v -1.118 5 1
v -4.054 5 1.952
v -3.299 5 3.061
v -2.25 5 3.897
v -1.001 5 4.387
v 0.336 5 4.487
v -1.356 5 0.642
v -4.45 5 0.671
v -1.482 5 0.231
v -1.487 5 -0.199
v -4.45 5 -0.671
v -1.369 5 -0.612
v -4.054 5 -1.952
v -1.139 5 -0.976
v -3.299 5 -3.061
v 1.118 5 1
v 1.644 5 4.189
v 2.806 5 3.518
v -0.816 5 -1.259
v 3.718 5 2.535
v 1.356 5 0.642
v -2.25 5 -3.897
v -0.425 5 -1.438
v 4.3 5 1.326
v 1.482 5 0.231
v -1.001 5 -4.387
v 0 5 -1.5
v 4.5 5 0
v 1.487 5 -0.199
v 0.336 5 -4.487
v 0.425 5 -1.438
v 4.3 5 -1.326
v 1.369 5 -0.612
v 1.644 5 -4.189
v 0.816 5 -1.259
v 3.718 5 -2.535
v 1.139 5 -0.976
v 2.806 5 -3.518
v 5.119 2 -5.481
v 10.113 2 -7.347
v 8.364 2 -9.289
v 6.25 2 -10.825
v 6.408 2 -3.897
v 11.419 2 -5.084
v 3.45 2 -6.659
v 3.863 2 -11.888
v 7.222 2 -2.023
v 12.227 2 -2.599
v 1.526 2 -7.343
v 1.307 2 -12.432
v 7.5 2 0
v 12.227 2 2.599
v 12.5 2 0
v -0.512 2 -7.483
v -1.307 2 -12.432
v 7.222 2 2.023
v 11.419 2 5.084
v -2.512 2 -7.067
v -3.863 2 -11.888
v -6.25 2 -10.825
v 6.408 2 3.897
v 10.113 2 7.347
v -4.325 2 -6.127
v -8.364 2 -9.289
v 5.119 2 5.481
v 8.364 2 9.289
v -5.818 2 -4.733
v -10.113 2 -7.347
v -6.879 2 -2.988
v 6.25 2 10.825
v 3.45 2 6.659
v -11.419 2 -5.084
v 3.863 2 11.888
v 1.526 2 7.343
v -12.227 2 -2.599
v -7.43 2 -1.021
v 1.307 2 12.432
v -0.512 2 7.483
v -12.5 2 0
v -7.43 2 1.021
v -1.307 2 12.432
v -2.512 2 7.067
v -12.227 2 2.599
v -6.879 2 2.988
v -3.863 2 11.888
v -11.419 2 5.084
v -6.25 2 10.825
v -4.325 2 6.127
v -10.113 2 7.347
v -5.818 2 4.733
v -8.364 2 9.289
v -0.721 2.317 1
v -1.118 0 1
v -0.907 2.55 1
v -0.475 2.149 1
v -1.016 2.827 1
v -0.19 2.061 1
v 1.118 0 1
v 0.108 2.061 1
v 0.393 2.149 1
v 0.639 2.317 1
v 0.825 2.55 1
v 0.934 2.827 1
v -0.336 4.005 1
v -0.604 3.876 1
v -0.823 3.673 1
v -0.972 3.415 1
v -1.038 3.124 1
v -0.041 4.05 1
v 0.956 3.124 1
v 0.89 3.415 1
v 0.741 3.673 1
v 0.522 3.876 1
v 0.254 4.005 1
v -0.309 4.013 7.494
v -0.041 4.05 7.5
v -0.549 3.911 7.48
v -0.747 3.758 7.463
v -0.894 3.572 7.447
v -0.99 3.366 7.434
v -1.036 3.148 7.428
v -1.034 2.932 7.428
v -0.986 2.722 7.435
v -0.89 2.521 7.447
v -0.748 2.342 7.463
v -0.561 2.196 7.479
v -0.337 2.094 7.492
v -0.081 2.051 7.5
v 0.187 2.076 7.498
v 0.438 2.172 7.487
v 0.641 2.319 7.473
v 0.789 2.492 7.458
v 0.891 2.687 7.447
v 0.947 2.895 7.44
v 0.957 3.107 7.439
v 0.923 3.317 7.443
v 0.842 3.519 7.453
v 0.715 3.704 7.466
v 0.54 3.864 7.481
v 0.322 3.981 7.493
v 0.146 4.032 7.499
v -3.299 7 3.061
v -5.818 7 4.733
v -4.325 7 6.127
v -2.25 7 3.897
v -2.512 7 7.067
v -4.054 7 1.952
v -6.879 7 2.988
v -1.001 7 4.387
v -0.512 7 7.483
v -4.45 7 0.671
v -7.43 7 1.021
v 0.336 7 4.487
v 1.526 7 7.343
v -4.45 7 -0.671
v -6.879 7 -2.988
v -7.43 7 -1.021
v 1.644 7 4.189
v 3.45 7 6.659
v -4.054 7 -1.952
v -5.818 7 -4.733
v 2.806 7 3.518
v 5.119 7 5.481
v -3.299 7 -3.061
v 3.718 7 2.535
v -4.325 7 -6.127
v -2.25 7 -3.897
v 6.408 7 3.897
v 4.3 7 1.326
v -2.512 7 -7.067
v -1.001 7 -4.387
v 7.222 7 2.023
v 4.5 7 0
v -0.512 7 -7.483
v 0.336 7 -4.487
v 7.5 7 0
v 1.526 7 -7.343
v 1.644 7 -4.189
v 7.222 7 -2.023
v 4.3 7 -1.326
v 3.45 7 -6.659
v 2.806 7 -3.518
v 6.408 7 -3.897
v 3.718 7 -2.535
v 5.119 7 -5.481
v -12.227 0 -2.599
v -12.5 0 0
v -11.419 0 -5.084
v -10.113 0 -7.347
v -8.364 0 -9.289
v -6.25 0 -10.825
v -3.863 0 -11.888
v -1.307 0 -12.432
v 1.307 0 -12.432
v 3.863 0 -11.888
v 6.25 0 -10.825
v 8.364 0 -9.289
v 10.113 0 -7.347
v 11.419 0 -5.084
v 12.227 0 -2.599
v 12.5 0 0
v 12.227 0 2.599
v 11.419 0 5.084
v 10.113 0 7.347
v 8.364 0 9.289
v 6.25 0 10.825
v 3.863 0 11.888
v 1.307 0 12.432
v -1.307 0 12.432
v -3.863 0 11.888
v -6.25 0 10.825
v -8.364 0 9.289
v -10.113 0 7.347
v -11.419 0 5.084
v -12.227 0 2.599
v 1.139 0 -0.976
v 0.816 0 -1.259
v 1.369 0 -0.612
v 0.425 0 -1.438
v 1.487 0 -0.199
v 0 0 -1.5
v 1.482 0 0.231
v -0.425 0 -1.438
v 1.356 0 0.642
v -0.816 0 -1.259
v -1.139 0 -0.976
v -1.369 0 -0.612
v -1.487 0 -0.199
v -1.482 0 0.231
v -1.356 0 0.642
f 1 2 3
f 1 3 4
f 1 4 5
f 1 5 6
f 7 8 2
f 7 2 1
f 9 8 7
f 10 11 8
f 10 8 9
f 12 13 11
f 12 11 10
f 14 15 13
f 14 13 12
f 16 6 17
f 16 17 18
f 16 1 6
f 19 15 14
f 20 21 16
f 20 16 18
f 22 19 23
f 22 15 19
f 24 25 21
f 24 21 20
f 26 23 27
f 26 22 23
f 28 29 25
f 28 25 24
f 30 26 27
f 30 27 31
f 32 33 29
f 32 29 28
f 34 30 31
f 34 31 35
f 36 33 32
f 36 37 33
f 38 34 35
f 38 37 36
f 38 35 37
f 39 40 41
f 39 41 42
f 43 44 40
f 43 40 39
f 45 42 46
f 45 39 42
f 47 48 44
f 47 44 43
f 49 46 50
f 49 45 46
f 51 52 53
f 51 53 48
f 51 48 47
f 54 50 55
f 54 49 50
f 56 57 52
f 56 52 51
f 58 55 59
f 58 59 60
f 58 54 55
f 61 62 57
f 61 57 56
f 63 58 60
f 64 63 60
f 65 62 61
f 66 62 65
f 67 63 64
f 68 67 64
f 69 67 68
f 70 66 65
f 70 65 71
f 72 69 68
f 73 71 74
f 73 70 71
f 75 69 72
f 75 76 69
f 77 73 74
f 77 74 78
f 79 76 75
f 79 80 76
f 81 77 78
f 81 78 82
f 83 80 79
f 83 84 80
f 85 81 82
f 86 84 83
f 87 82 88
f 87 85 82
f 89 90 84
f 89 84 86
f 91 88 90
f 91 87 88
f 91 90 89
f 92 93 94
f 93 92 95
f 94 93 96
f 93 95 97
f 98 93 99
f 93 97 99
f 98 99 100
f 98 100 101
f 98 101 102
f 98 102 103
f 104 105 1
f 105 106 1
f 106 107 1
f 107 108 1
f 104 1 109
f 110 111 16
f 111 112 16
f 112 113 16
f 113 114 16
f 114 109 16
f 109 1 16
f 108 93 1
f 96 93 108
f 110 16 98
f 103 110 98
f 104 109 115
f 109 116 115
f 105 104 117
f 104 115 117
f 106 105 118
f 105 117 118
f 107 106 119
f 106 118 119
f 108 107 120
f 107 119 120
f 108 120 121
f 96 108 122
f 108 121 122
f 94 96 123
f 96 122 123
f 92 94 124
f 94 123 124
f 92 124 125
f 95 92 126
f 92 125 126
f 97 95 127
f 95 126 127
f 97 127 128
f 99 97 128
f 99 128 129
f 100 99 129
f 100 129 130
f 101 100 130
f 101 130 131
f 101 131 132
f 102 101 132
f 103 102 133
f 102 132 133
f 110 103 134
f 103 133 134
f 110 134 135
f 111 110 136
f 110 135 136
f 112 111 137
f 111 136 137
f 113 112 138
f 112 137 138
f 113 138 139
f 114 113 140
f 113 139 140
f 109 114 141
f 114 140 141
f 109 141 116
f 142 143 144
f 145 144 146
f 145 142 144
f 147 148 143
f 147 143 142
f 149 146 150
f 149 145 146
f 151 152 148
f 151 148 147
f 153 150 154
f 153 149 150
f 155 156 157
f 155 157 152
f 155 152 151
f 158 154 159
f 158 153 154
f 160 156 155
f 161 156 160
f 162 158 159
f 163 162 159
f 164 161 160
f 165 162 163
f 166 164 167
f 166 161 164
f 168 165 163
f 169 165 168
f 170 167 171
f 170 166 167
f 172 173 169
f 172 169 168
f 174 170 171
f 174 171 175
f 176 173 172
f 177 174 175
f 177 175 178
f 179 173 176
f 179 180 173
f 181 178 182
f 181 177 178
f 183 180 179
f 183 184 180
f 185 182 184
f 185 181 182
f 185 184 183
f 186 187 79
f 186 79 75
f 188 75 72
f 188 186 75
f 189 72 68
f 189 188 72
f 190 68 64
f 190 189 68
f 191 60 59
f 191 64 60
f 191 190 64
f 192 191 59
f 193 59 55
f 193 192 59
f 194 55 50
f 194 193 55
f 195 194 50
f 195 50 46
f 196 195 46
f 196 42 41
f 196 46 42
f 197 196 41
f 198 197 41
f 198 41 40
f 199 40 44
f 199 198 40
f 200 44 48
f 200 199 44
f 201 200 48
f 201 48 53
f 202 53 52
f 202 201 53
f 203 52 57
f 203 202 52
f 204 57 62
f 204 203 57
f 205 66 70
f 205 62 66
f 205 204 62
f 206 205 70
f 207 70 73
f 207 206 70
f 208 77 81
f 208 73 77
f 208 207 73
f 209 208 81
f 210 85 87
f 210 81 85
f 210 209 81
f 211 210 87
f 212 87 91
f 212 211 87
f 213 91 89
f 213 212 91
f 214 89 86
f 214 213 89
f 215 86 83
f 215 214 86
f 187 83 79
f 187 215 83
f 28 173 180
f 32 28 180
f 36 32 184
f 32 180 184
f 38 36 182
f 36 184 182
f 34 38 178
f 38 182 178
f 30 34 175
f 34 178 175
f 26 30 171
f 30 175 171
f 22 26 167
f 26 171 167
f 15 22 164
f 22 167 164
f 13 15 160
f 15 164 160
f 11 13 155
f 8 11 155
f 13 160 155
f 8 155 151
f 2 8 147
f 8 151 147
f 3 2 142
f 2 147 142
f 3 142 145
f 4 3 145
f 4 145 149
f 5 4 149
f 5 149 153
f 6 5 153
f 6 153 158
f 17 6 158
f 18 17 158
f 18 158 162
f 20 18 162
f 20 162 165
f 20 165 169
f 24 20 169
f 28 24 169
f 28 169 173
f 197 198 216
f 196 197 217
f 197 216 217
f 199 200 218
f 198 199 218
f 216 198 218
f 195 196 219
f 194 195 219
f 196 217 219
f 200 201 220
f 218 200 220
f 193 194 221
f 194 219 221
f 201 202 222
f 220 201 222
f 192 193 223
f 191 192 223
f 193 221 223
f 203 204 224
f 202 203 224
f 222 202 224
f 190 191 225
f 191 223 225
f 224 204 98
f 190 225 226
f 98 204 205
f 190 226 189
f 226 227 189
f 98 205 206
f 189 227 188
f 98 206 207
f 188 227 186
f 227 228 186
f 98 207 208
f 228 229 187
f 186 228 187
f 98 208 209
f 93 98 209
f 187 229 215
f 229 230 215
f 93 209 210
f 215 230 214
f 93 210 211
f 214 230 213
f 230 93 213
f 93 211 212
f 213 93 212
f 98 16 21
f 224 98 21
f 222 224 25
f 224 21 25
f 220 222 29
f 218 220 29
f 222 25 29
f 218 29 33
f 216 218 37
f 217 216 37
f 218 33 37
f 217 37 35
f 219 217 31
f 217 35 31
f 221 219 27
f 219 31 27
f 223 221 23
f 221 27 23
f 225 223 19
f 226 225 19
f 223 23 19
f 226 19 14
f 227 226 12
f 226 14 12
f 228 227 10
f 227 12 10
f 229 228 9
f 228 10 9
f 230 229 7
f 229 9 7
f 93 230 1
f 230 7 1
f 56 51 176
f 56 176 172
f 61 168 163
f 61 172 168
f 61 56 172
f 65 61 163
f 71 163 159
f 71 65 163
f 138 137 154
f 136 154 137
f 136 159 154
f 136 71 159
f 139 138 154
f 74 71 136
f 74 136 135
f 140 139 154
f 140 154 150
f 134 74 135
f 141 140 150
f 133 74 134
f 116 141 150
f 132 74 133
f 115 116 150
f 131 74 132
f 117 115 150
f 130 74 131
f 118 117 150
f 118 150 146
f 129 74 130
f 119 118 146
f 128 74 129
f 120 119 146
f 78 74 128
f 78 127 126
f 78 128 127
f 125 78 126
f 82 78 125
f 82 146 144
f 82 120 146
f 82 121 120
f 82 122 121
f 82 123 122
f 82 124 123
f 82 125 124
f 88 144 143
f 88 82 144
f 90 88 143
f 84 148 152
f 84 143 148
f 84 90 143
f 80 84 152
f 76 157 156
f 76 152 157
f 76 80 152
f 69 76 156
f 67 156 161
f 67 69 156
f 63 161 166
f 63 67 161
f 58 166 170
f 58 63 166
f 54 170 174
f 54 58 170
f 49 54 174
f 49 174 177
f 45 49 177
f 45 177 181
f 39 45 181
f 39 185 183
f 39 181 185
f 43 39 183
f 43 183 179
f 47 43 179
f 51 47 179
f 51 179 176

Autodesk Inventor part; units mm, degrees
ref_plane "YZ Plane" through (0, 0, 0) normal (1, 0, 0) x (0, 1, 0)
ref_plane "XZ Plane" through (0, 0, 0) normal (0, 1, 0) x (-1, 0, 0)
ref_plane "XY Plane" through (0, 0, 0) normal (0, 0, 1) x (1, 0, 0)
sketch "Esquisse3" plane through (0, 0, 0) normal (0, 1, 0) x (-1, 0, 0)
  circle A0 centre (0, 0) radius 12.5
  dimension "d3" = 25
extrude "Extrusion2" add sketch "Esquisse3" along normal blind 2
sketch "Esquisse4" plane through (0, 2, 0) normal (0, 1, 0) x (1, 0, 0)
  circle A0 centre (0, 0) radius 12.5 projected
  circle A1 centre (0, 0) radius 7.5
  dimension "d6" = 15
extrude "Extrusion3" add sketch "Esquisse4" along normal blind 5 contours A1
sketch "Esquisse5" plane through (0, 7, 0) normal (0, 1, 0) x (1, 0, 0)
  circle A0 centre (0, 0) radius 7.5 projected
  circle A1 centre (0, 0) radius 4.5
  dimension "d9" = 9
extrude "Extrusion4" cut sketch "Esquisse5" against normal blind 2 contours A1
sketch "Esquisse6" plane through (0, 5, 0) normal (0, 1, 0) x (1, 0, 0)
  circle A0 centre (0, 0) radius 4.5 projected
  circle A1 centre (0, 0) radius 1.5
  line L0 (-1.118, -1) -> (1.118, -1)
  dimension "d12" = 3
  dimension "d13" = 2.5
extrude "Extrusion5" cut sketch "Esquisse6" against normal through all contours A1 L0 picked at (0.0594, -0.1702)
hole "Perçage1" at (-0.041, 3.0497, 1) direction (0, 0, 1) diameter 2 end through all
properties part number "Poulie1"
